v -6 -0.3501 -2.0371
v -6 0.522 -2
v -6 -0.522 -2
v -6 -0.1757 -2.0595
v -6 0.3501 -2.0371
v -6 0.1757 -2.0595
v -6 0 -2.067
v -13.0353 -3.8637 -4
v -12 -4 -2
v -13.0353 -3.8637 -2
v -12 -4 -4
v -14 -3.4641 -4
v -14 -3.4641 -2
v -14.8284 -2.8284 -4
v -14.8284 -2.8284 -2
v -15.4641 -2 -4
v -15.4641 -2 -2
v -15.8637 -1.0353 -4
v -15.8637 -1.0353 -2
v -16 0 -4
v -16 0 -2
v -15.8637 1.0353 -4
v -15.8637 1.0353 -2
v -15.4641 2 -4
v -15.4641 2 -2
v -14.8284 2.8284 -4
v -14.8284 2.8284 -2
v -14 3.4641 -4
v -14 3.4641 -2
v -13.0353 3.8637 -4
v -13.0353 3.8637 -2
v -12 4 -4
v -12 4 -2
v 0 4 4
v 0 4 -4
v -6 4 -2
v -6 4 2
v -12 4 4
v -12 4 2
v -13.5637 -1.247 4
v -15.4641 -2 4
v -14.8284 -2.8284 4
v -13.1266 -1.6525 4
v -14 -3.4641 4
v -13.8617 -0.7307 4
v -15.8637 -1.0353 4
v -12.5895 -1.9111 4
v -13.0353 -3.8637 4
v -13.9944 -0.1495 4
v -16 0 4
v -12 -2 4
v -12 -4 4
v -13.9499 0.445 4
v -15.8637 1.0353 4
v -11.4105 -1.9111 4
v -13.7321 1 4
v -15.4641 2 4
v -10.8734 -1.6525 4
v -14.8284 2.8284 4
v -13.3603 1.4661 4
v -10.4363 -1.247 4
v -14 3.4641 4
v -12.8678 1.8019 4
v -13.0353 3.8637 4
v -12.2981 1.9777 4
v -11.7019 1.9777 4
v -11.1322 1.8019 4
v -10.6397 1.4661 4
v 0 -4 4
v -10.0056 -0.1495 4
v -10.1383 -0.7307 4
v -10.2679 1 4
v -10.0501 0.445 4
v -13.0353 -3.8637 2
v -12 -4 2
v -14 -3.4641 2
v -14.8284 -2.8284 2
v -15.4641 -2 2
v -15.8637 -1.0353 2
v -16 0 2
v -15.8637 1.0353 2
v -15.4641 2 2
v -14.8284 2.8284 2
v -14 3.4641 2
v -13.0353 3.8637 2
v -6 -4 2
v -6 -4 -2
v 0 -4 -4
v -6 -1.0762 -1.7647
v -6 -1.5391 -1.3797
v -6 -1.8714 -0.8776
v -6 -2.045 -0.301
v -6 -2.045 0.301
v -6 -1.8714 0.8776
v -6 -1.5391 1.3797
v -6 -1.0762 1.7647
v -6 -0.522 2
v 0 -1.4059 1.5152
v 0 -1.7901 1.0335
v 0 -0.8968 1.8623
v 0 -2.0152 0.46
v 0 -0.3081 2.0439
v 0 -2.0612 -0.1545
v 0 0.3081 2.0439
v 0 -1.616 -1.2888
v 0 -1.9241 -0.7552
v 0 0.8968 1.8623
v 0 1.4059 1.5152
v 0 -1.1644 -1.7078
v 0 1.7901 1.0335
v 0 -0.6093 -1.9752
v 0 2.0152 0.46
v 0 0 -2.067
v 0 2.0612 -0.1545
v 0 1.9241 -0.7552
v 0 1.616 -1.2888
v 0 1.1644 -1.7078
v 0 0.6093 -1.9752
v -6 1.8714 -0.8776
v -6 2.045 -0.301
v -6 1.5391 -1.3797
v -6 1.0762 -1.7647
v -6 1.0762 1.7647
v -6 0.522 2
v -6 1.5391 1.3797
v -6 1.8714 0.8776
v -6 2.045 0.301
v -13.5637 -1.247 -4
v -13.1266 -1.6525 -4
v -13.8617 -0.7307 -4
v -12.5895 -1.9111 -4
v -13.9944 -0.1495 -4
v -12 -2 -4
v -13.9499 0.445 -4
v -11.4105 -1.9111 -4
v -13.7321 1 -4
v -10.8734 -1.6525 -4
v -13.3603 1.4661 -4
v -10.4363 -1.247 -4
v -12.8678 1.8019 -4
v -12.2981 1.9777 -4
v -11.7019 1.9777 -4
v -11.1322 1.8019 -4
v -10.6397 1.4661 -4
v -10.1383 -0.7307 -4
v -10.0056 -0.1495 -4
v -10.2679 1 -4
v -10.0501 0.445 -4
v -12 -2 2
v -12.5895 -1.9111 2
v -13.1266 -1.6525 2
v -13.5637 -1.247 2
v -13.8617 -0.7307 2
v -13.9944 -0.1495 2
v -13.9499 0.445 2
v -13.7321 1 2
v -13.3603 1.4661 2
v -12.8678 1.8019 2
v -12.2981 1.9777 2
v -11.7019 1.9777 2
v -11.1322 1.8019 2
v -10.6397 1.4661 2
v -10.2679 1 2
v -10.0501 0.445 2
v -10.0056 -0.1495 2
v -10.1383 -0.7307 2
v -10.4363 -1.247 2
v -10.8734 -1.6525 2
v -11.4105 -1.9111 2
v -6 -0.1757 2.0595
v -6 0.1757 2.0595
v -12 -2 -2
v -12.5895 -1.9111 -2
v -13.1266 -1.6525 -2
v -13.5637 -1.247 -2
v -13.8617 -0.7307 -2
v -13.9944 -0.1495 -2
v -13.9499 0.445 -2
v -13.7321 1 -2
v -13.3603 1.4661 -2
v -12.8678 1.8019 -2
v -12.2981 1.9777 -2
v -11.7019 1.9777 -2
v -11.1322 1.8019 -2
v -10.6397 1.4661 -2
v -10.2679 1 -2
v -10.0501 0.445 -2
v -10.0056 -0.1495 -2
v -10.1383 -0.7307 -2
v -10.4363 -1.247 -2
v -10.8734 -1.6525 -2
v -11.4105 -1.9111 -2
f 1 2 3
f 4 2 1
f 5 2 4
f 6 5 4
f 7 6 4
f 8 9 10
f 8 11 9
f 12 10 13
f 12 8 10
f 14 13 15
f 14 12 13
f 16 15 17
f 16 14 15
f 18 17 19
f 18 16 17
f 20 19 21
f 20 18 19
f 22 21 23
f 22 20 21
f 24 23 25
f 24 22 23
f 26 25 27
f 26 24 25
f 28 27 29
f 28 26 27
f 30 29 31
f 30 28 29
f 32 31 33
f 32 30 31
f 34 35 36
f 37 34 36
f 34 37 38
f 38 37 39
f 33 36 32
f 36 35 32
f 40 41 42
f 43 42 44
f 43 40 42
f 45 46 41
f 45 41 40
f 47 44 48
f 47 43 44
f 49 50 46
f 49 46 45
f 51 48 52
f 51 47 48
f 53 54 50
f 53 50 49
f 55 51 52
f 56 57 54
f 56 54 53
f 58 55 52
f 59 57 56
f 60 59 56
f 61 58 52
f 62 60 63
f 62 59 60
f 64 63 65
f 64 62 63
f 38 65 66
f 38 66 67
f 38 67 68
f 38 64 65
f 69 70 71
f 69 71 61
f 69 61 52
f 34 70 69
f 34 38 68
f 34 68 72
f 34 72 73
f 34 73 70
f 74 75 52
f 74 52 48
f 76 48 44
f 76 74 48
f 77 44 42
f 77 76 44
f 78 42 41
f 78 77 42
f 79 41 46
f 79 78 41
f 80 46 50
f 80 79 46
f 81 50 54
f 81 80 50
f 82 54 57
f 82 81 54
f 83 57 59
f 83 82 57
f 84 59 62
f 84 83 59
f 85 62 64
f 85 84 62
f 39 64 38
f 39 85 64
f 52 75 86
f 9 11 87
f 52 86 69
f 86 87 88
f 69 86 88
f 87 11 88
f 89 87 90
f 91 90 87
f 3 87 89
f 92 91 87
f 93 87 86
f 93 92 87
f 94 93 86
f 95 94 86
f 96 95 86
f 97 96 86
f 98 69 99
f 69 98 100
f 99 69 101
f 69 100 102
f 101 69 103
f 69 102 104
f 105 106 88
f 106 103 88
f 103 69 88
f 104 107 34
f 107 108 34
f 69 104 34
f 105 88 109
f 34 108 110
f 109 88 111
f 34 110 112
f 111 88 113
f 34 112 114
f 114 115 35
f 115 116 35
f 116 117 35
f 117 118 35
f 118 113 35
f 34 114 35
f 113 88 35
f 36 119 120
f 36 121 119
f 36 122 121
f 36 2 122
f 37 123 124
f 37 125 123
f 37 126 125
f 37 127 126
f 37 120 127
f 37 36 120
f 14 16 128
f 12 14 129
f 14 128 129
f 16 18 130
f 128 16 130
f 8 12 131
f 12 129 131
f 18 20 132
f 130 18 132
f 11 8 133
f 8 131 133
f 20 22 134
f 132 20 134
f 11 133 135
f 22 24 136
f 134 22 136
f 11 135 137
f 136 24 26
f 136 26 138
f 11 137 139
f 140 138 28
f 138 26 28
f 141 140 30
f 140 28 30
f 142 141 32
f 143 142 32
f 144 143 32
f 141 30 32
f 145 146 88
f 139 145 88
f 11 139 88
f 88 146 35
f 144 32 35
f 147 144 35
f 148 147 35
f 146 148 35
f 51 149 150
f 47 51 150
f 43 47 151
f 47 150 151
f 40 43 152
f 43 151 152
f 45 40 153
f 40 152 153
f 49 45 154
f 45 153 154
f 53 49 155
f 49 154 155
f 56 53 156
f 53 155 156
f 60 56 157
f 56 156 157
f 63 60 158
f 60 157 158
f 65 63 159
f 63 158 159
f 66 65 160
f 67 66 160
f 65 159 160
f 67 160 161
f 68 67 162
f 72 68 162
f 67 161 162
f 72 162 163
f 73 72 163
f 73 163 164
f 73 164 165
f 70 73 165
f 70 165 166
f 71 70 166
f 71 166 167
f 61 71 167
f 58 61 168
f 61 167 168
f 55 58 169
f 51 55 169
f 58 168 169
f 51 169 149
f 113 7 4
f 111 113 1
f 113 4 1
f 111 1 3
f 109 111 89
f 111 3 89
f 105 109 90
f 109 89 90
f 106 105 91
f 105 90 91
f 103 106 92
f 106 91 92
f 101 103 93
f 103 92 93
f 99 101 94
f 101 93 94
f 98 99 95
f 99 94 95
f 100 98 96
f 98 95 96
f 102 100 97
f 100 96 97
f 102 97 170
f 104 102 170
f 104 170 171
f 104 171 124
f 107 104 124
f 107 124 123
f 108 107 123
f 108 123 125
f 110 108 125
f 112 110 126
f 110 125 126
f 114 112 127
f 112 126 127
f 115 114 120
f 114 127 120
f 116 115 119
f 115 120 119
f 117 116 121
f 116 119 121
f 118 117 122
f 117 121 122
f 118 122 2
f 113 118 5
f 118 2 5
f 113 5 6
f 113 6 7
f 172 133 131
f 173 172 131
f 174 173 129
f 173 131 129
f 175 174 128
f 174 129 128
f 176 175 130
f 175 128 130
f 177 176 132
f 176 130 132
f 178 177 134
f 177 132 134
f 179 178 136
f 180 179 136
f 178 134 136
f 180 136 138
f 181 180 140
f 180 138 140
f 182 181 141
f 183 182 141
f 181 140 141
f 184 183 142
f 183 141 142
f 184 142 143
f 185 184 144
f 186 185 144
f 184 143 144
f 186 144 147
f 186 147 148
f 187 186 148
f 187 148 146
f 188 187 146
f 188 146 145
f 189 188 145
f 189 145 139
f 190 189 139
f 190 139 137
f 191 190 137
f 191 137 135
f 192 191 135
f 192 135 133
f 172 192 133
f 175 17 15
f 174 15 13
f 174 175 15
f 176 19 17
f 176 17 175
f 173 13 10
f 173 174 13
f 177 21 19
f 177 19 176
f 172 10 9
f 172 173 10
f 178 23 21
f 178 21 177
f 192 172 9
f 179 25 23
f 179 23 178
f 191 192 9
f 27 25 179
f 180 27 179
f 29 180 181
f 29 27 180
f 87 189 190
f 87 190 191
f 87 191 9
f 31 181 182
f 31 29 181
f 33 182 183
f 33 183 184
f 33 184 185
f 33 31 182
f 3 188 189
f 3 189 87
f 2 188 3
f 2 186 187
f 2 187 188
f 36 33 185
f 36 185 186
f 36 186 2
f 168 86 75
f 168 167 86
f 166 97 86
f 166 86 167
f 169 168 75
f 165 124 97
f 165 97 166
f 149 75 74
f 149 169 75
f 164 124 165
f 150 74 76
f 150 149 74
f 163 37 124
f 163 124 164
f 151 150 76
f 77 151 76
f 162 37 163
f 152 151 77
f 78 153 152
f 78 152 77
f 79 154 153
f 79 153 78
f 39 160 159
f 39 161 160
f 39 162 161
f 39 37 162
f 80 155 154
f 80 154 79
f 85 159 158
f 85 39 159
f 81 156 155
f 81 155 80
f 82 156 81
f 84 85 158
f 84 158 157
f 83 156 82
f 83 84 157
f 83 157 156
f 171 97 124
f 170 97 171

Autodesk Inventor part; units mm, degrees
ref_plane "YZ Plane" through (0, 0, 0) normal (1, 0, 0) x (0, 1, 0)
ref_plane "XZ Plane" through (0, 0, 0) normal (0, 1, 0) x (-1, 0, 0)
ref_plane "XY Plane" through (0, 0, 0) normal (0, 0, 1) x (1, 0, 0)
sketch "Sketch1" plane through (0, 0, 0) normal (0, 0, 1) x (1, 0, 0)
  line L0 (0, 4) -> (-12, 4)
  line L1 (-12, -4) -> (0, -4)
  line L2 (0, -4) -> (0, 4)
  arc A0 (-12, 4) -> (-12, -4) centre (-12, 0) ccw
  point P0 (0, 0)
  point P1 (0, 0)
  dimension "d0" = 4
  dimension "d1" = 12
  dimension "d2" = 8
extrude "Extrusion1" add sketch "Sketch1" along normal mid plane 8
sketch "Sketch3" plane through (0, 0, 4) normal (0, 0, 1) x (1, 0, 0)
  arc A0 (-12, 4) -> (-12, -4) centre (-12, 0) ccw projected
  point P0 (0, 0)
  point P1 (-12, 0)
hole "Hole1" at (-12, 0, 4) direction (0, 0, -1) diameter 4 depth 8
sketch "Sketch2" plane through (-12, 4, 4) normal (0, 1, 0) x (1, 0, 0)
  line L0 (-4, 6) -> (6, 6)
  line L1 (6, 6) -> (6, 2)
  line L2 (6, 2) -> (-4, 2)
  line L3 (-4, 2) -> (-4, 6)
  line L4 (12, 8) -> (12, 0) projected
  line L5 (-4, 8) -> (-4, 0) projected
  point P0 (12, 4)
  point P1 (12, 4)
  point P2 (-4, 4)
  dimension "d5" = 10
  dimension "d6" = 4
extrude "Extrusion2" cut sketch "Sketch2" against normal up to surface (8 mm away)
sketch "Sketch4" plane through (0, -4, 4) normal (1, 0, 0) x (0, 0, -1)
  point P0 (4, 4)
  point P1 (4, 4)
hole "Hole2" at (0, 0, 0) direction (-1, 0, 0) diameter 4.134 depth 6 thread size "M5x0.8" class "6H" standard "ISO Metric profile"
properties part number "207 part 2"
